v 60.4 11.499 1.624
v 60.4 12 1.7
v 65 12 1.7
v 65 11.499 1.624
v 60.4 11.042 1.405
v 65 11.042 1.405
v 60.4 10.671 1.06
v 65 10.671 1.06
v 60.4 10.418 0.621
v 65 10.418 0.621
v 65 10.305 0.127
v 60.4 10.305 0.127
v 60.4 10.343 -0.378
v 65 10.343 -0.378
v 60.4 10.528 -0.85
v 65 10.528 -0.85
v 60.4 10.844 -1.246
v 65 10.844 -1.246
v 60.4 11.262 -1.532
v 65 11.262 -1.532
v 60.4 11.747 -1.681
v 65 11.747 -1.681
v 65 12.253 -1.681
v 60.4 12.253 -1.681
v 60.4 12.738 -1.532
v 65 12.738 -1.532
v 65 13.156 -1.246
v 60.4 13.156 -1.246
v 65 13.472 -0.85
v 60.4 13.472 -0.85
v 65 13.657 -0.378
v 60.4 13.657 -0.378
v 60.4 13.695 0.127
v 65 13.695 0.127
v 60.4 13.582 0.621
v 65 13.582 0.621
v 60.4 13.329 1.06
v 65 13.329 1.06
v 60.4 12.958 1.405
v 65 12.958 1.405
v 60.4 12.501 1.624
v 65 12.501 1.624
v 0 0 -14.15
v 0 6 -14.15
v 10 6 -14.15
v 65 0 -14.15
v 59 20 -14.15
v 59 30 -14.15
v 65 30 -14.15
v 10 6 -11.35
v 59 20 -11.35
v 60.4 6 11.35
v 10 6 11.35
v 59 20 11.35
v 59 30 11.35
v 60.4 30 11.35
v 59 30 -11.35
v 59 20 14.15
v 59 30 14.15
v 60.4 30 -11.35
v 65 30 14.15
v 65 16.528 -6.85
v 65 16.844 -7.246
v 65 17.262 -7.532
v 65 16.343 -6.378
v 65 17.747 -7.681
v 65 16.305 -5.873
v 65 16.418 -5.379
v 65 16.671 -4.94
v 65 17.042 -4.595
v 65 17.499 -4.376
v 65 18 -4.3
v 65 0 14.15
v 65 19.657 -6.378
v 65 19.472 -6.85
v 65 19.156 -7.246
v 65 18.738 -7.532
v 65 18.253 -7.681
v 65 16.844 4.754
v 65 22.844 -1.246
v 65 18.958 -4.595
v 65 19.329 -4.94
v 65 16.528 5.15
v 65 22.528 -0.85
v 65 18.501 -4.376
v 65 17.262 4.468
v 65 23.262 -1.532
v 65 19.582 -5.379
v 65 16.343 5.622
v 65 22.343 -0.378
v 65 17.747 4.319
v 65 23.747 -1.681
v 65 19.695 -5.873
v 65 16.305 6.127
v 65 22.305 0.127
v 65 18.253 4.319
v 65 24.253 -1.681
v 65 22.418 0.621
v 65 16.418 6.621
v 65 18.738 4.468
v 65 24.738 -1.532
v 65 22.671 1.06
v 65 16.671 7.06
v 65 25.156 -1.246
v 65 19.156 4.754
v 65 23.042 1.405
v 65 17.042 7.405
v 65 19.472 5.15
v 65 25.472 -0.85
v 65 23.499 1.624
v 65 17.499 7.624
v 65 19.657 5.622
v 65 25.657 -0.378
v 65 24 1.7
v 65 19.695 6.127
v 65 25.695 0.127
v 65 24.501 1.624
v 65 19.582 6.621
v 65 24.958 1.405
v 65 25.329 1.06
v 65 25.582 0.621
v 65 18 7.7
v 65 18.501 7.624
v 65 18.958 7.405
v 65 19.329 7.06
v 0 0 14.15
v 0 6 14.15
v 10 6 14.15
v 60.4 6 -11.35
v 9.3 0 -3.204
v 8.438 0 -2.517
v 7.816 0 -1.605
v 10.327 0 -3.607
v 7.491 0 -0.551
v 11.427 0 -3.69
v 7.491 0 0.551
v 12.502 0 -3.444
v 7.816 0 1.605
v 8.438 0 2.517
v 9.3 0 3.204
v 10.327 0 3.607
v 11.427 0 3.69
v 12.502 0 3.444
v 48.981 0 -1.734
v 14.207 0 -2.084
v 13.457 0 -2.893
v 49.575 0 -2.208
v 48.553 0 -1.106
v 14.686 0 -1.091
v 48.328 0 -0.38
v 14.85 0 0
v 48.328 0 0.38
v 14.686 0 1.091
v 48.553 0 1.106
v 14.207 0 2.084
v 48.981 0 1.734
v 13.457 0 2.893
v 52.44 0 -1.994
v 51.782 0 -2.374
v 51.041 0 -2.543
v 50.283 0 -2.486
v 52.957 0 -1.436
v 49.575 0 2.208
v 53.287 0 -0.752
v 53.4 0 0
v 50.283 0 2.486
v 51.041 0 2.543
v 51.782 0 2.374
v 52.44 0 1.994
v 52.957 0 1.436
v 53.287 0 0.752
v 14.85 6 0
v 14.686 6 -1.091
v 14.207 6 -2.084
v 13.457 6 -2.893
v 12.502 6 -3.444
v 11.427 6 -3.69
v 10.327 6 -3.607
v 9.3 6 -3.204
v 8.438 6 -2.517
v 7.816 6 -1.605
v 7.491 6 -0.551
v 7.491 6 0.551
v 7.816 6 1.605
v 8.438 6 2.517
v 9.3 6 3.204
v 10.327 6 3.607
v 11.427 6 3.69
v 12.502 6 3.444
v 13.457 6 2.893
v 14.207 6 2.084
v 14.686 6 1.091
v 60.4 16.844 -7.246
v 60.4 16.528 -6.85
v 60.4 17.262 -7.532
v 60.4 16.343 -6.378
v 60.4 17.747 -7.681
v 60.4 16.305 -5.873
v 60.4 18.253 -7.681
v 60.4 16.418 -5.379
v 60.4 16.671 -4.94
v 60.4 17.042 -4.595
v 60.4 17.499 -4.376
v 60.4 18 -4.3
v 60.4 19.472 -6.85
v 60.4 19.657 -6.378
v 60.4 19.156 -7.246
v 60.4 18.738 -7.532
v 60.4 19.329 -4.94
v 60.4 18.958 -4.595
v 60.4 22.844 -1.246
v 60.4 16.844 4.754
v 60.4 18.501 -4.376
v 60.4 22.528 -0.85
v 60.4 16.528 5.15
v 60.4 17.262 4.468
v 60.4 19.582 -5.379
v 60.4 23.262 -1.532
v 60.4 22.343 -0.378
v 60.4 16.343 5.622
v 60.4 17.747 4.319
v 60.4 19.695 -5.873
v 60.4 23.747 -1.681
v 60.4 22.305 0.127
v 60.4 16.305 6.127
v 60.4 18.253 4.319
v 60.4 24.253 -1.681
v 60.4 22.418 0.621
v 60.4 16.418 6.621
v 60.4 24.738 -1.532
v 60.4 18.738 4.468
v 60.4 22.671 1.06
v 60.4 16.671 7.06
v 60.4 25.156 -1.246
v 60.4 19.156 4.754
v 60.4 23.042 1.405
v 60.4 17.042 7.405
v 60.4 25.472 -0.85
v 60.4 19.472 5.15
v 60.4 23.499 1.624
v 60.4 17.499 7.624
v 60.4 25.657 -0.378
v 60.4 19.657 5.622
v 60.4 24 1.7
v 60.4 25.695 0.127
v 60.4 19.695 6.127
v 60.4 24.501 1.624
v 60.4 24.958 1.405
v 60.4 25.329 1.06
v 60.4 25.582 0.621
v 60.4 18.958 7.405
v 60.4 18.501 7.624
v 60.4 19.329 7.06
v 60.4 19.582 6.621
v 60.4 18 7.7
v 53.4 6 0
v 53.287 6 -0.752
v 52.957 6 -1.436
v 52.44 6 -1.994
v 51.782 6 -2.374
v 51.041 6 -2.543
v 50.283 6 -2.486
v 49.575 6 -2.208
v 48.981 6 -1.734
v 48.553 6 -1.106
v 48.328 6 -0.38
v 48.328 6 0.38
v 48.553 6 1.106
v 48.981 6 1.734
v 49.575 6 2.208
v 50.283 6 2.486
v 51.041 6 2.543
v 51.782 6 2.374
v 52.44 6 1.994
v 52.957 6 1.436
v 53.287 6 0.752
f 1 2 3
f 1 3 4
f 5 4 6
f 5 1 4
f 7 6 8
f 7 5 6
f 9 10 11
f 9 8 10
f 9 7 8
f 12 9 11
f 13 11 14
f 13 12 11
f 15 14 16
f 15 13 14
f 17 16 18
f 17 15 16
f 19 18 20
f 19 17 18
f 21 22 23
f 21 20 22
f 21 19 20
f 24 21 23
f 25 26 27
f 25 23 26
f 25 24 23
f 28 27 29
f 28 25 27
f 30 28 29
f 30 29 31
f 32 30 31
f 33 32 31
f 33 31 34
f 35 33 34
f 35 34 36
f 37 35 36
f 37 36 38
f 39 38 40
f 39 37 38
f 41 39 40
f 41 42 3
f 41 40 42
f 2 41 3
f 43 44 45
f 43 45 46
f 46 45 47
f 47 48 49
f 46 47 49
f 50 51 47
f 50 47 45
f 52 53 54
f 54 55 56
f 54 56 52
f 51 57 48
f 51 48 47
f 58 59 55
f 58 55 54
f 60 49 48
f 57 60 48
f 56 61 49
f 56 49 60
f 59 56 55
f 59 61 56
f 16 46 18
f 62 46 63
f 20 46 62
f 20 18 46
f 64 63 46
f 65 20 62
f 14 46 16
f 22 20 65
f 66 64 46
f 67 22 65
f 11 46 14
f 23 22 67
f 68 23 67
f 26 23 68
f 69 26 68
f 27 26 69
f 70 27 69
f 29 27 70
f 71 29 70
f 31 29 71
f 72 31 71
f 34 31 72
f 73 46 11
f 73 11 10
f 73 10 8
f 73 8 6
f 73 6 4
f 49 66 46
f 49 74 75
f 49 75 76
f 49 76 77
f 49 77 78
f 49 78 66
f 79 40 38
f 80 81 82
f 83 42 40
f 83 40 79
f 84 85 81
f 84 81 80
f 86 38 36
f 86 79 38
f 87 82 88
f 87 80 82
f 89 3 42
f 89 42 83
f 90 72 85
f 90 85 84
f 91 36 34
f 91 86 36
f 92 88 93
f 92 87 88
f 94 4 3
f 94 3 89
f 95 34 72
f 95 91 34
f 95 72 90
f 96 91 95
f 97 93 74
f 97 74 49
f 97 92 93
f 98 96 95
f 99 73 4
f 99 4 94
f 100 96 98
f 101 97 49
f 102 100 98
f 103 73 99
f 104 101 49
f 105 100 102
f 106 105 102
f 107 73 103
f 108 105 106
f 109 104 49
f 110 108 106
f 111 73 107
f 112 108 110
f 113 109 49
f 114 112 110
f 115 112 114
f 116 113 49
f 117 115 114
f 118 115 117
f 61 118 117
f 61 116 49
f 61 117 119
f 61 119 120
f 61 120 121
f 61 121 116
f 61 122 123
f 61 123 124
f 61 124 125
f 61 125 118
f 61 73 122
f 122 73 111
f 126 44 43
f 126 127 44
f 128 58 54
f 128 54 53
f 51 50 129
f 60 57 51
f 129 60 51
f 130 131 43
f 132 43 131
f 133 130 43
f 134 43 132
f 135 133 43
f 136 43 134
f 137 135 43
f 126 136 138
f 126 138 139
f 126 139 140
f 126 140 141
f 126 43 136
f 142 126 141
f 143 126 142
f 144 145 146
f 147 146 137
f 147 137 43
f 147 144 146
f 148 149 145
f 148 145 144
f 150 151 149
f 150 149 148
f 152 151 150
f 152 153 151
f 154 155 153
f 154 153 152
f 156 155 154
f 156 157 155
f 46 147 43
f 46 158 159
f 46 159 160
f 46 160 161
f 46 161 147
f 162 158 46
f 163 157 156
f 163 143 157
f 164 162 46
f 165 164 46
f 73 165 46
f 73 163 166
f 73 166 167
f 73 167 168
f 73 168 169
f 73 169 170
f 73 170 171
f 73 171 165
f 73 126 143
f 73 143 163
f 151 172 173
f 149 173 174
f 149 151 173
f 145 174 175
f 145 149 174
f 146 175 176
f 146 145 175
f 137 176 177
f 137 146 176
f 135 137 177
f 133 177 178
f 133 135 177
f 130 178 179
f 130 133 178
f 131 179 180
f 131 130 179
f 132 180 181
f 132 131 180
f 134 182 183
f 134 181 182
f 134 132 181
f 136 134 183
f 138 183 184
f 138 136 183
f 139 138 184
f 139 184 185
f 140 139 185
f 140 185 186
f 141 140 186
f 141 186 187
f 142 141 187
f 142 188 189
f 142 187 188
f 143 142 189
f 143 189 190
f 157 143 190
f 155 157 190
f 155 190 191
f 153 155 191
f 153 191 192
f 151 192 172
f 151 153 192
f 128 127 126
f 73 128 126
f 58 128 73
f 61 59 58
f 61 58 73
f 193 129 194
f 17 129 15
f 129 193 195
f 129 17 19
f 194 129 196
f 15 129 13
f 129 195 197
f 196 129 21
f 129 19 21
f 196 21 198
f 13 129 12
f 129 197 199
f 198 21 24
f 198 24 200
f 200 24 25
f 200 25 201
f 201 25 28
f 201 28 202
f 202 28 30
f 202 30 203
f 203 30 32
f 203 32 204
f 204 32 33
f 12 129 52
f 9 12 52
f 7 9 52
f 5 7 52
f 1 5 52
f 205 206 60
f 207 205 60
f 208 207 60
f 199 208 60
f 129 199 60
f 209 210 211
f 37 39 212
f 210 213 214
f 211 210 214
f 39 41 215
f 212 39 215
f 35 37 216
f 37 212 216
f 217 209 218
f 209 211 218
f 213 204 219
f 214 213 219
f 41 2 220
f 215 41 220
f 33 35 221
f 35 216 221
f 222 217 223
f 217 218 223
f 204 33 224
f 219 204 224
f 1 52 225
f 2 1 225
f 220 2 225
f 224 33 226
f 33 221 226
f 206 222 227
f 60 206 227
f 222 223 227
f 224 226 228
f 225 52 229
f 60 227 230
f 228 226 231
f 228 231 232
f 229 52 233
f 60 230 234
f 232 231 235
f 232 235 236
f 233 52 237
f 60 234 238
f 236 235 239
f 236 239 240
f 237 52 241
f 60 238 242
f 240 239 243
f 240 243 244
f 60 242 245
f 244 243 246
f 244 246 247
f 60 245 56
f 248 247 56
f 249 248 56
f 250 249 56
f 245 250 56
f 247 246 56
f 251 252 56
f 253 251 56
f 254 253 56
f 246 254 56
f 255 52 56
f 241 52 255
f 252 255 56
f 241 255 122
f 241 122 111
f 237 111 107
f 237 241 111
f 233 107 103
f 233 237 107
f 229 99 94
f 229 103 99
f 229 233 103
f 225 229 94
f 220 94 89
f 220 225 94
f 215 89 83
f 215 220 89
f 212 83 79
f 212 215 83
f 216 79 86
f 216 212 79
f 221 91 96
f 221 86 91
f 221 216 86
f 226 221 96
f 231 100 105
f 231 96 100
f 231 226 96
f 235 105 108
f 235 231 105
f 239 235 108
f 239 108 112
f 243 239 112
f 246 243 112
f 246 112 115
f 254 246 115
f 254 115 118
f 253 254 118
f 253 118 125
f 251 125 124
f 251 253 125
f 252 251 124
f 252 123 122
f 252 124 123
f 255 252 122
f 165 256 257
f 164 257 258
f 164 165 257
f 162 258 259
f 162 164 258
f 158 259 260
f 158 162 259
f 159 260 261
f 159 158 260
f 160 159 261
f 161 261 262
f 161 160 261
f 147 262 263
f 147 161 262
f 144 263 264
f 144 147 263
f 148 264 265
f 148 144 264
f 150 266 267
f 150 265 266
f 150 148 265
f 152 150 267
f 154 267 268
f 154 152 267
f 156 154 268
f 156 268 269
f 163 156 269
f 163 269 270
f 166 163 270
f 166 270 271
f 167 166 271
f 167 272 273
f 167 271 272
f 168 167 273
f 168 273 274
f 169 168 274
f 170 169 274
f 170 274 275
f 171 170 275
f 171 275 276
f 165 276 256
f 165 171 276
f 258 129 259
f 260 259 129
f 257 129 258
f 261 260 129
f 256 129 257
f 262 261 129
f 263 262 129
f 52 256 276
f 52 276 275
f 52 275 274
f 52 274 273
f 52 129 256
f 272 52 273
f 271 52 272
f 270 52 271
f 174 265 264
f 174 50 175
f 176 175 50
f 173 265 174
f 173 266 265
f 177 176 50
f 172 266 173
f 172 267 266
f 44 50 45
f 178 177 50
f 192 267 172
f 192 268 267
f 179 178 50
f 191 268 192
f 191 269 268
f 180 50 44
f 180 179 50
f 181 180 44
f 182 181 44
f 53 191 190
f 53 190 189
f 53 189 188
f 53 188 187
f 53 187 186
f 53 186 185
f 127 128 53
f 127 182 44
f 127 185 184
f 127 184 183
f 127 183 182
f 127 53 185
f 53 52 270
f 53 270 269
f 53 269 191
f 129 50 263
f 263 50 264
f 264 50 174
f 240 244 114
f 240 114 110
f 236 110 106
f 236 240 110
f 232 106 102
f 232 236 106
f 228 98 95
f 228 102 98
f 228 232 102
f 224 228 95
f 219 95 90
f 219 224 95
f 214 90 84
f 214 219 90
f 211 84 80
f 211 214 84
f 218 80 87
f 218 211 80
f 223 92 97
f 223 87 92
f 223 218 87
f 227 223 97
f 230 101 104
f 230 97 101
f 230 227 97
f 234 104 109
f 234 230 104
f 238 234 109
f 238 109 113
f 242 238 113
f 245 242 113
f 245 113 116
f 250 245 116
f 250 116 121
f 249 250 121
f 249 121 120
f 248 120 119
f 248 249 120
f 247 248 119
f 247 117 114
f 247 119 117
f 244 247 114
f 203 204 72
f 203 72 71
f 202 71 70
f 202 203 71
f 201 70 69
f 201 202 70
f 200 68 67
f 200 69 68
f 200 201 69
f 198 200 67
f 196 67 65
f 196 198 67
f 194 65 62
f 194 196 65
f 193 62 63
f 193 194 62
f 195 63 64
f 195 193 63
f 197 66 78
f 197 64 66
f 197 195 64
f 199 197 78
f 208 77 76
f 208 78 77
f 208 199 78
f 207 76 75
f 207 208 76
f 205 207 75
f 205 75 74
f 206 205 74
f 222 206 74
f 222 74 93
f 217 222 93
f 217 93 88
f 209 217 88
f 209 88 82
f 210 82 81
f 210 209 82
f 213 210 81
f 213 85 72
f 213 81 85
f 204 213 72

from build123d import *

# Parameters (mm, degrees)
EXTRUDE_1_DEPTH     = 14.15
SKETCH_2_W          = 60.4
SKETCH_2_H          = 24
CUT_EXTRUDE_1_DEPTH = 11.35
CUT_EXTRUDE_2_REACH = 74.974
SKETCH_4_R          = 2.55
SKETCH_4_R_2        = 3.7
CUT_EXTRUDE_3_REACH = 74.974
SKETCH_5_R          = 1.7


with BuildPart() as part:
    # 草图1 → 凸台-拉伸1 (new, symmetric)
    with BuildSketch(Plane.XY):
        Polygon((0, 0), (65, 0), (65, 30), (59, 30), (59, 20), (10, 6), (0, 6), align=None)
    extrude(amount=EXTRUDE_1_DEPTH, both=True)

    # 草图2 → 切除-拉伸1 (cut, symmetric)
    with BuildSketch(Plane.XY):
        with Locations((30.2, 18)):
            Rectangle(SKETCH_2_W, SKETCH_2_H)
    extrude(amount=CUT_EXTRUDE_1_DEPTH, both=True, mode=Mode.SUBTRACT)

    # 草图4 → 切除-拉伸2 (cut, up to next)
    with BuildSketch(Plane(origin=(0, 0, 0), x_dir=(1, 0, 0), z_dir=(0, 1, 0)), mode=Mode.PRIVATE) as cut_extrude_2_sk1:
        with Locations((50.85, 0)):
            Circle(SKETCH_4_R)
    cut_extrude_2_tool1 = extrude(cut_extrude_2_sk1.sketch, amount=CUT_EXTRUDE_2_REACH, mode=Mode.PRIVATE) & part.part
    # 草图4 → 切除-拉伸2 (cut, up to next)
    with BuildSketch(Plane(origin=(0, 0, 0), x_dir=(1, 0, 0), z_dir=(0, 1, 0)), mode=Mode.PRIVATE) as cut_extrude_2_sk2:
        with Locations((11.15, 0)):
            Circle(SKETCH_4_R_2)
    cut_extrude_2_tool2 = extrude(cut_extrude_2_sk2.sketch, amount=CUT_EXTRUDE_2_REACH, mode=Mode.PRIVATE) & part.part
    add(cut_extrude_2_tool1.solids().sort_by_distance((50.85, 0, 0))[0], mode=Mode.SUBTRACT)
    add(cut_extrude_2_tool2.solids().sort_by_distance((11.15, 0, 0))[0], mode=Mode.SUBTRACT)

    # 草图5 → 切除-拉伸3 (cut, up to next)
    with BuildSketch(Plane(origin=(0, 0, 0), x_dir=(0, 0, -1), z_dir=(1, 0, 0)), mode=Mode.PRIVATE) as cut_extrude_3_sk1:
        with Locations(Location((0, 24, 0), (0, 0, 180))):
            Circle(SKETCH_5_R)
    cut_extrude_3_tool1 = extrude(cut_extrude_3_sk1.sketch, amount=CUT_EXTRUDE_3_REACH, mode=Mode.PRIVATE) & part.part
    # 草图5 → 切除-拉伸3 (cut, up to next)
    with BuildSketch(Plane(origin=(0, 0, 0), x_dir=(0, 0, -1), z_dir=(1, 0, 0)), mode=Mode.PRIVATE) as cut_extrude_3_sk2:
        with Locations(Location((0, 12, 0), (0, 0, 180))):
            Circle(SKETCH_5_R)
    cut_extrude_3_tool2 = extrude(cut_extrude_3_sk2.sketch, amount=CUT_EXTRUDE_3_REACH, mode=Mode.PRIVATE) & part.part
    # 草图5 → 切除-拉伸3 (cut, up to next)
    with BuildSketch(Plane(origin=(0, 0, 0), x_dir=(0, 0, -1), z_dir=(1, 0, 0)), mode=Mode.PRIVATE) as cut_extrude_3_sk3:
        with Locations(Location((-6, 18, 0), (0, 0, 180))):
            Circle(SKETCH_5_R)
    cut_extrude_3_tool3 = extrude(cut_extrude_3_sk3.sketch, amount=CUT_EXTRUDE_3_REACH, mode=Mode.PRIVATE) & part.part
    # 草图5 → 切除-拉伸3 (cut, up to next)
    with BuildSketch(Plane(origin=(0, 0, 0), x_dir=(0, 0, -1), z_dir=(1, 0, 0)), mode=Mode.PRIVATE) as cut_extrude_3_sk4:
        with Locations(Location((6, 18, 0), (0, 0, 180))):
            Circle(SKETCH_5_R)
    cut_extrude_3_tool4 = extrude(cut_extrude_3_sk4.sketch, amount=CUT_EXTRUDE_3_REACH, mode=Mode.PRIVATE) & part.part
    add(cut_extrude_3_tool1.solids().sort_by_distance((0, 24, 0))[0], mode=Mode.SUBTRACT)
    add(cut_extrude_3_tool2.solids().sort_by_distance((0, 12, 0))[0], mode=Mode.SUBTRACT)
    add(cut_extrude_3_tool3.solids().sort_by_distance((0, 18, 6))[0], mode=Mode.SUBTRACT)
    add(cut_extrude_3_tool4.solids().sort_by_distance((0, 18, -6))[0], mode=Mode.SUBTRACT)


solid = part.part
